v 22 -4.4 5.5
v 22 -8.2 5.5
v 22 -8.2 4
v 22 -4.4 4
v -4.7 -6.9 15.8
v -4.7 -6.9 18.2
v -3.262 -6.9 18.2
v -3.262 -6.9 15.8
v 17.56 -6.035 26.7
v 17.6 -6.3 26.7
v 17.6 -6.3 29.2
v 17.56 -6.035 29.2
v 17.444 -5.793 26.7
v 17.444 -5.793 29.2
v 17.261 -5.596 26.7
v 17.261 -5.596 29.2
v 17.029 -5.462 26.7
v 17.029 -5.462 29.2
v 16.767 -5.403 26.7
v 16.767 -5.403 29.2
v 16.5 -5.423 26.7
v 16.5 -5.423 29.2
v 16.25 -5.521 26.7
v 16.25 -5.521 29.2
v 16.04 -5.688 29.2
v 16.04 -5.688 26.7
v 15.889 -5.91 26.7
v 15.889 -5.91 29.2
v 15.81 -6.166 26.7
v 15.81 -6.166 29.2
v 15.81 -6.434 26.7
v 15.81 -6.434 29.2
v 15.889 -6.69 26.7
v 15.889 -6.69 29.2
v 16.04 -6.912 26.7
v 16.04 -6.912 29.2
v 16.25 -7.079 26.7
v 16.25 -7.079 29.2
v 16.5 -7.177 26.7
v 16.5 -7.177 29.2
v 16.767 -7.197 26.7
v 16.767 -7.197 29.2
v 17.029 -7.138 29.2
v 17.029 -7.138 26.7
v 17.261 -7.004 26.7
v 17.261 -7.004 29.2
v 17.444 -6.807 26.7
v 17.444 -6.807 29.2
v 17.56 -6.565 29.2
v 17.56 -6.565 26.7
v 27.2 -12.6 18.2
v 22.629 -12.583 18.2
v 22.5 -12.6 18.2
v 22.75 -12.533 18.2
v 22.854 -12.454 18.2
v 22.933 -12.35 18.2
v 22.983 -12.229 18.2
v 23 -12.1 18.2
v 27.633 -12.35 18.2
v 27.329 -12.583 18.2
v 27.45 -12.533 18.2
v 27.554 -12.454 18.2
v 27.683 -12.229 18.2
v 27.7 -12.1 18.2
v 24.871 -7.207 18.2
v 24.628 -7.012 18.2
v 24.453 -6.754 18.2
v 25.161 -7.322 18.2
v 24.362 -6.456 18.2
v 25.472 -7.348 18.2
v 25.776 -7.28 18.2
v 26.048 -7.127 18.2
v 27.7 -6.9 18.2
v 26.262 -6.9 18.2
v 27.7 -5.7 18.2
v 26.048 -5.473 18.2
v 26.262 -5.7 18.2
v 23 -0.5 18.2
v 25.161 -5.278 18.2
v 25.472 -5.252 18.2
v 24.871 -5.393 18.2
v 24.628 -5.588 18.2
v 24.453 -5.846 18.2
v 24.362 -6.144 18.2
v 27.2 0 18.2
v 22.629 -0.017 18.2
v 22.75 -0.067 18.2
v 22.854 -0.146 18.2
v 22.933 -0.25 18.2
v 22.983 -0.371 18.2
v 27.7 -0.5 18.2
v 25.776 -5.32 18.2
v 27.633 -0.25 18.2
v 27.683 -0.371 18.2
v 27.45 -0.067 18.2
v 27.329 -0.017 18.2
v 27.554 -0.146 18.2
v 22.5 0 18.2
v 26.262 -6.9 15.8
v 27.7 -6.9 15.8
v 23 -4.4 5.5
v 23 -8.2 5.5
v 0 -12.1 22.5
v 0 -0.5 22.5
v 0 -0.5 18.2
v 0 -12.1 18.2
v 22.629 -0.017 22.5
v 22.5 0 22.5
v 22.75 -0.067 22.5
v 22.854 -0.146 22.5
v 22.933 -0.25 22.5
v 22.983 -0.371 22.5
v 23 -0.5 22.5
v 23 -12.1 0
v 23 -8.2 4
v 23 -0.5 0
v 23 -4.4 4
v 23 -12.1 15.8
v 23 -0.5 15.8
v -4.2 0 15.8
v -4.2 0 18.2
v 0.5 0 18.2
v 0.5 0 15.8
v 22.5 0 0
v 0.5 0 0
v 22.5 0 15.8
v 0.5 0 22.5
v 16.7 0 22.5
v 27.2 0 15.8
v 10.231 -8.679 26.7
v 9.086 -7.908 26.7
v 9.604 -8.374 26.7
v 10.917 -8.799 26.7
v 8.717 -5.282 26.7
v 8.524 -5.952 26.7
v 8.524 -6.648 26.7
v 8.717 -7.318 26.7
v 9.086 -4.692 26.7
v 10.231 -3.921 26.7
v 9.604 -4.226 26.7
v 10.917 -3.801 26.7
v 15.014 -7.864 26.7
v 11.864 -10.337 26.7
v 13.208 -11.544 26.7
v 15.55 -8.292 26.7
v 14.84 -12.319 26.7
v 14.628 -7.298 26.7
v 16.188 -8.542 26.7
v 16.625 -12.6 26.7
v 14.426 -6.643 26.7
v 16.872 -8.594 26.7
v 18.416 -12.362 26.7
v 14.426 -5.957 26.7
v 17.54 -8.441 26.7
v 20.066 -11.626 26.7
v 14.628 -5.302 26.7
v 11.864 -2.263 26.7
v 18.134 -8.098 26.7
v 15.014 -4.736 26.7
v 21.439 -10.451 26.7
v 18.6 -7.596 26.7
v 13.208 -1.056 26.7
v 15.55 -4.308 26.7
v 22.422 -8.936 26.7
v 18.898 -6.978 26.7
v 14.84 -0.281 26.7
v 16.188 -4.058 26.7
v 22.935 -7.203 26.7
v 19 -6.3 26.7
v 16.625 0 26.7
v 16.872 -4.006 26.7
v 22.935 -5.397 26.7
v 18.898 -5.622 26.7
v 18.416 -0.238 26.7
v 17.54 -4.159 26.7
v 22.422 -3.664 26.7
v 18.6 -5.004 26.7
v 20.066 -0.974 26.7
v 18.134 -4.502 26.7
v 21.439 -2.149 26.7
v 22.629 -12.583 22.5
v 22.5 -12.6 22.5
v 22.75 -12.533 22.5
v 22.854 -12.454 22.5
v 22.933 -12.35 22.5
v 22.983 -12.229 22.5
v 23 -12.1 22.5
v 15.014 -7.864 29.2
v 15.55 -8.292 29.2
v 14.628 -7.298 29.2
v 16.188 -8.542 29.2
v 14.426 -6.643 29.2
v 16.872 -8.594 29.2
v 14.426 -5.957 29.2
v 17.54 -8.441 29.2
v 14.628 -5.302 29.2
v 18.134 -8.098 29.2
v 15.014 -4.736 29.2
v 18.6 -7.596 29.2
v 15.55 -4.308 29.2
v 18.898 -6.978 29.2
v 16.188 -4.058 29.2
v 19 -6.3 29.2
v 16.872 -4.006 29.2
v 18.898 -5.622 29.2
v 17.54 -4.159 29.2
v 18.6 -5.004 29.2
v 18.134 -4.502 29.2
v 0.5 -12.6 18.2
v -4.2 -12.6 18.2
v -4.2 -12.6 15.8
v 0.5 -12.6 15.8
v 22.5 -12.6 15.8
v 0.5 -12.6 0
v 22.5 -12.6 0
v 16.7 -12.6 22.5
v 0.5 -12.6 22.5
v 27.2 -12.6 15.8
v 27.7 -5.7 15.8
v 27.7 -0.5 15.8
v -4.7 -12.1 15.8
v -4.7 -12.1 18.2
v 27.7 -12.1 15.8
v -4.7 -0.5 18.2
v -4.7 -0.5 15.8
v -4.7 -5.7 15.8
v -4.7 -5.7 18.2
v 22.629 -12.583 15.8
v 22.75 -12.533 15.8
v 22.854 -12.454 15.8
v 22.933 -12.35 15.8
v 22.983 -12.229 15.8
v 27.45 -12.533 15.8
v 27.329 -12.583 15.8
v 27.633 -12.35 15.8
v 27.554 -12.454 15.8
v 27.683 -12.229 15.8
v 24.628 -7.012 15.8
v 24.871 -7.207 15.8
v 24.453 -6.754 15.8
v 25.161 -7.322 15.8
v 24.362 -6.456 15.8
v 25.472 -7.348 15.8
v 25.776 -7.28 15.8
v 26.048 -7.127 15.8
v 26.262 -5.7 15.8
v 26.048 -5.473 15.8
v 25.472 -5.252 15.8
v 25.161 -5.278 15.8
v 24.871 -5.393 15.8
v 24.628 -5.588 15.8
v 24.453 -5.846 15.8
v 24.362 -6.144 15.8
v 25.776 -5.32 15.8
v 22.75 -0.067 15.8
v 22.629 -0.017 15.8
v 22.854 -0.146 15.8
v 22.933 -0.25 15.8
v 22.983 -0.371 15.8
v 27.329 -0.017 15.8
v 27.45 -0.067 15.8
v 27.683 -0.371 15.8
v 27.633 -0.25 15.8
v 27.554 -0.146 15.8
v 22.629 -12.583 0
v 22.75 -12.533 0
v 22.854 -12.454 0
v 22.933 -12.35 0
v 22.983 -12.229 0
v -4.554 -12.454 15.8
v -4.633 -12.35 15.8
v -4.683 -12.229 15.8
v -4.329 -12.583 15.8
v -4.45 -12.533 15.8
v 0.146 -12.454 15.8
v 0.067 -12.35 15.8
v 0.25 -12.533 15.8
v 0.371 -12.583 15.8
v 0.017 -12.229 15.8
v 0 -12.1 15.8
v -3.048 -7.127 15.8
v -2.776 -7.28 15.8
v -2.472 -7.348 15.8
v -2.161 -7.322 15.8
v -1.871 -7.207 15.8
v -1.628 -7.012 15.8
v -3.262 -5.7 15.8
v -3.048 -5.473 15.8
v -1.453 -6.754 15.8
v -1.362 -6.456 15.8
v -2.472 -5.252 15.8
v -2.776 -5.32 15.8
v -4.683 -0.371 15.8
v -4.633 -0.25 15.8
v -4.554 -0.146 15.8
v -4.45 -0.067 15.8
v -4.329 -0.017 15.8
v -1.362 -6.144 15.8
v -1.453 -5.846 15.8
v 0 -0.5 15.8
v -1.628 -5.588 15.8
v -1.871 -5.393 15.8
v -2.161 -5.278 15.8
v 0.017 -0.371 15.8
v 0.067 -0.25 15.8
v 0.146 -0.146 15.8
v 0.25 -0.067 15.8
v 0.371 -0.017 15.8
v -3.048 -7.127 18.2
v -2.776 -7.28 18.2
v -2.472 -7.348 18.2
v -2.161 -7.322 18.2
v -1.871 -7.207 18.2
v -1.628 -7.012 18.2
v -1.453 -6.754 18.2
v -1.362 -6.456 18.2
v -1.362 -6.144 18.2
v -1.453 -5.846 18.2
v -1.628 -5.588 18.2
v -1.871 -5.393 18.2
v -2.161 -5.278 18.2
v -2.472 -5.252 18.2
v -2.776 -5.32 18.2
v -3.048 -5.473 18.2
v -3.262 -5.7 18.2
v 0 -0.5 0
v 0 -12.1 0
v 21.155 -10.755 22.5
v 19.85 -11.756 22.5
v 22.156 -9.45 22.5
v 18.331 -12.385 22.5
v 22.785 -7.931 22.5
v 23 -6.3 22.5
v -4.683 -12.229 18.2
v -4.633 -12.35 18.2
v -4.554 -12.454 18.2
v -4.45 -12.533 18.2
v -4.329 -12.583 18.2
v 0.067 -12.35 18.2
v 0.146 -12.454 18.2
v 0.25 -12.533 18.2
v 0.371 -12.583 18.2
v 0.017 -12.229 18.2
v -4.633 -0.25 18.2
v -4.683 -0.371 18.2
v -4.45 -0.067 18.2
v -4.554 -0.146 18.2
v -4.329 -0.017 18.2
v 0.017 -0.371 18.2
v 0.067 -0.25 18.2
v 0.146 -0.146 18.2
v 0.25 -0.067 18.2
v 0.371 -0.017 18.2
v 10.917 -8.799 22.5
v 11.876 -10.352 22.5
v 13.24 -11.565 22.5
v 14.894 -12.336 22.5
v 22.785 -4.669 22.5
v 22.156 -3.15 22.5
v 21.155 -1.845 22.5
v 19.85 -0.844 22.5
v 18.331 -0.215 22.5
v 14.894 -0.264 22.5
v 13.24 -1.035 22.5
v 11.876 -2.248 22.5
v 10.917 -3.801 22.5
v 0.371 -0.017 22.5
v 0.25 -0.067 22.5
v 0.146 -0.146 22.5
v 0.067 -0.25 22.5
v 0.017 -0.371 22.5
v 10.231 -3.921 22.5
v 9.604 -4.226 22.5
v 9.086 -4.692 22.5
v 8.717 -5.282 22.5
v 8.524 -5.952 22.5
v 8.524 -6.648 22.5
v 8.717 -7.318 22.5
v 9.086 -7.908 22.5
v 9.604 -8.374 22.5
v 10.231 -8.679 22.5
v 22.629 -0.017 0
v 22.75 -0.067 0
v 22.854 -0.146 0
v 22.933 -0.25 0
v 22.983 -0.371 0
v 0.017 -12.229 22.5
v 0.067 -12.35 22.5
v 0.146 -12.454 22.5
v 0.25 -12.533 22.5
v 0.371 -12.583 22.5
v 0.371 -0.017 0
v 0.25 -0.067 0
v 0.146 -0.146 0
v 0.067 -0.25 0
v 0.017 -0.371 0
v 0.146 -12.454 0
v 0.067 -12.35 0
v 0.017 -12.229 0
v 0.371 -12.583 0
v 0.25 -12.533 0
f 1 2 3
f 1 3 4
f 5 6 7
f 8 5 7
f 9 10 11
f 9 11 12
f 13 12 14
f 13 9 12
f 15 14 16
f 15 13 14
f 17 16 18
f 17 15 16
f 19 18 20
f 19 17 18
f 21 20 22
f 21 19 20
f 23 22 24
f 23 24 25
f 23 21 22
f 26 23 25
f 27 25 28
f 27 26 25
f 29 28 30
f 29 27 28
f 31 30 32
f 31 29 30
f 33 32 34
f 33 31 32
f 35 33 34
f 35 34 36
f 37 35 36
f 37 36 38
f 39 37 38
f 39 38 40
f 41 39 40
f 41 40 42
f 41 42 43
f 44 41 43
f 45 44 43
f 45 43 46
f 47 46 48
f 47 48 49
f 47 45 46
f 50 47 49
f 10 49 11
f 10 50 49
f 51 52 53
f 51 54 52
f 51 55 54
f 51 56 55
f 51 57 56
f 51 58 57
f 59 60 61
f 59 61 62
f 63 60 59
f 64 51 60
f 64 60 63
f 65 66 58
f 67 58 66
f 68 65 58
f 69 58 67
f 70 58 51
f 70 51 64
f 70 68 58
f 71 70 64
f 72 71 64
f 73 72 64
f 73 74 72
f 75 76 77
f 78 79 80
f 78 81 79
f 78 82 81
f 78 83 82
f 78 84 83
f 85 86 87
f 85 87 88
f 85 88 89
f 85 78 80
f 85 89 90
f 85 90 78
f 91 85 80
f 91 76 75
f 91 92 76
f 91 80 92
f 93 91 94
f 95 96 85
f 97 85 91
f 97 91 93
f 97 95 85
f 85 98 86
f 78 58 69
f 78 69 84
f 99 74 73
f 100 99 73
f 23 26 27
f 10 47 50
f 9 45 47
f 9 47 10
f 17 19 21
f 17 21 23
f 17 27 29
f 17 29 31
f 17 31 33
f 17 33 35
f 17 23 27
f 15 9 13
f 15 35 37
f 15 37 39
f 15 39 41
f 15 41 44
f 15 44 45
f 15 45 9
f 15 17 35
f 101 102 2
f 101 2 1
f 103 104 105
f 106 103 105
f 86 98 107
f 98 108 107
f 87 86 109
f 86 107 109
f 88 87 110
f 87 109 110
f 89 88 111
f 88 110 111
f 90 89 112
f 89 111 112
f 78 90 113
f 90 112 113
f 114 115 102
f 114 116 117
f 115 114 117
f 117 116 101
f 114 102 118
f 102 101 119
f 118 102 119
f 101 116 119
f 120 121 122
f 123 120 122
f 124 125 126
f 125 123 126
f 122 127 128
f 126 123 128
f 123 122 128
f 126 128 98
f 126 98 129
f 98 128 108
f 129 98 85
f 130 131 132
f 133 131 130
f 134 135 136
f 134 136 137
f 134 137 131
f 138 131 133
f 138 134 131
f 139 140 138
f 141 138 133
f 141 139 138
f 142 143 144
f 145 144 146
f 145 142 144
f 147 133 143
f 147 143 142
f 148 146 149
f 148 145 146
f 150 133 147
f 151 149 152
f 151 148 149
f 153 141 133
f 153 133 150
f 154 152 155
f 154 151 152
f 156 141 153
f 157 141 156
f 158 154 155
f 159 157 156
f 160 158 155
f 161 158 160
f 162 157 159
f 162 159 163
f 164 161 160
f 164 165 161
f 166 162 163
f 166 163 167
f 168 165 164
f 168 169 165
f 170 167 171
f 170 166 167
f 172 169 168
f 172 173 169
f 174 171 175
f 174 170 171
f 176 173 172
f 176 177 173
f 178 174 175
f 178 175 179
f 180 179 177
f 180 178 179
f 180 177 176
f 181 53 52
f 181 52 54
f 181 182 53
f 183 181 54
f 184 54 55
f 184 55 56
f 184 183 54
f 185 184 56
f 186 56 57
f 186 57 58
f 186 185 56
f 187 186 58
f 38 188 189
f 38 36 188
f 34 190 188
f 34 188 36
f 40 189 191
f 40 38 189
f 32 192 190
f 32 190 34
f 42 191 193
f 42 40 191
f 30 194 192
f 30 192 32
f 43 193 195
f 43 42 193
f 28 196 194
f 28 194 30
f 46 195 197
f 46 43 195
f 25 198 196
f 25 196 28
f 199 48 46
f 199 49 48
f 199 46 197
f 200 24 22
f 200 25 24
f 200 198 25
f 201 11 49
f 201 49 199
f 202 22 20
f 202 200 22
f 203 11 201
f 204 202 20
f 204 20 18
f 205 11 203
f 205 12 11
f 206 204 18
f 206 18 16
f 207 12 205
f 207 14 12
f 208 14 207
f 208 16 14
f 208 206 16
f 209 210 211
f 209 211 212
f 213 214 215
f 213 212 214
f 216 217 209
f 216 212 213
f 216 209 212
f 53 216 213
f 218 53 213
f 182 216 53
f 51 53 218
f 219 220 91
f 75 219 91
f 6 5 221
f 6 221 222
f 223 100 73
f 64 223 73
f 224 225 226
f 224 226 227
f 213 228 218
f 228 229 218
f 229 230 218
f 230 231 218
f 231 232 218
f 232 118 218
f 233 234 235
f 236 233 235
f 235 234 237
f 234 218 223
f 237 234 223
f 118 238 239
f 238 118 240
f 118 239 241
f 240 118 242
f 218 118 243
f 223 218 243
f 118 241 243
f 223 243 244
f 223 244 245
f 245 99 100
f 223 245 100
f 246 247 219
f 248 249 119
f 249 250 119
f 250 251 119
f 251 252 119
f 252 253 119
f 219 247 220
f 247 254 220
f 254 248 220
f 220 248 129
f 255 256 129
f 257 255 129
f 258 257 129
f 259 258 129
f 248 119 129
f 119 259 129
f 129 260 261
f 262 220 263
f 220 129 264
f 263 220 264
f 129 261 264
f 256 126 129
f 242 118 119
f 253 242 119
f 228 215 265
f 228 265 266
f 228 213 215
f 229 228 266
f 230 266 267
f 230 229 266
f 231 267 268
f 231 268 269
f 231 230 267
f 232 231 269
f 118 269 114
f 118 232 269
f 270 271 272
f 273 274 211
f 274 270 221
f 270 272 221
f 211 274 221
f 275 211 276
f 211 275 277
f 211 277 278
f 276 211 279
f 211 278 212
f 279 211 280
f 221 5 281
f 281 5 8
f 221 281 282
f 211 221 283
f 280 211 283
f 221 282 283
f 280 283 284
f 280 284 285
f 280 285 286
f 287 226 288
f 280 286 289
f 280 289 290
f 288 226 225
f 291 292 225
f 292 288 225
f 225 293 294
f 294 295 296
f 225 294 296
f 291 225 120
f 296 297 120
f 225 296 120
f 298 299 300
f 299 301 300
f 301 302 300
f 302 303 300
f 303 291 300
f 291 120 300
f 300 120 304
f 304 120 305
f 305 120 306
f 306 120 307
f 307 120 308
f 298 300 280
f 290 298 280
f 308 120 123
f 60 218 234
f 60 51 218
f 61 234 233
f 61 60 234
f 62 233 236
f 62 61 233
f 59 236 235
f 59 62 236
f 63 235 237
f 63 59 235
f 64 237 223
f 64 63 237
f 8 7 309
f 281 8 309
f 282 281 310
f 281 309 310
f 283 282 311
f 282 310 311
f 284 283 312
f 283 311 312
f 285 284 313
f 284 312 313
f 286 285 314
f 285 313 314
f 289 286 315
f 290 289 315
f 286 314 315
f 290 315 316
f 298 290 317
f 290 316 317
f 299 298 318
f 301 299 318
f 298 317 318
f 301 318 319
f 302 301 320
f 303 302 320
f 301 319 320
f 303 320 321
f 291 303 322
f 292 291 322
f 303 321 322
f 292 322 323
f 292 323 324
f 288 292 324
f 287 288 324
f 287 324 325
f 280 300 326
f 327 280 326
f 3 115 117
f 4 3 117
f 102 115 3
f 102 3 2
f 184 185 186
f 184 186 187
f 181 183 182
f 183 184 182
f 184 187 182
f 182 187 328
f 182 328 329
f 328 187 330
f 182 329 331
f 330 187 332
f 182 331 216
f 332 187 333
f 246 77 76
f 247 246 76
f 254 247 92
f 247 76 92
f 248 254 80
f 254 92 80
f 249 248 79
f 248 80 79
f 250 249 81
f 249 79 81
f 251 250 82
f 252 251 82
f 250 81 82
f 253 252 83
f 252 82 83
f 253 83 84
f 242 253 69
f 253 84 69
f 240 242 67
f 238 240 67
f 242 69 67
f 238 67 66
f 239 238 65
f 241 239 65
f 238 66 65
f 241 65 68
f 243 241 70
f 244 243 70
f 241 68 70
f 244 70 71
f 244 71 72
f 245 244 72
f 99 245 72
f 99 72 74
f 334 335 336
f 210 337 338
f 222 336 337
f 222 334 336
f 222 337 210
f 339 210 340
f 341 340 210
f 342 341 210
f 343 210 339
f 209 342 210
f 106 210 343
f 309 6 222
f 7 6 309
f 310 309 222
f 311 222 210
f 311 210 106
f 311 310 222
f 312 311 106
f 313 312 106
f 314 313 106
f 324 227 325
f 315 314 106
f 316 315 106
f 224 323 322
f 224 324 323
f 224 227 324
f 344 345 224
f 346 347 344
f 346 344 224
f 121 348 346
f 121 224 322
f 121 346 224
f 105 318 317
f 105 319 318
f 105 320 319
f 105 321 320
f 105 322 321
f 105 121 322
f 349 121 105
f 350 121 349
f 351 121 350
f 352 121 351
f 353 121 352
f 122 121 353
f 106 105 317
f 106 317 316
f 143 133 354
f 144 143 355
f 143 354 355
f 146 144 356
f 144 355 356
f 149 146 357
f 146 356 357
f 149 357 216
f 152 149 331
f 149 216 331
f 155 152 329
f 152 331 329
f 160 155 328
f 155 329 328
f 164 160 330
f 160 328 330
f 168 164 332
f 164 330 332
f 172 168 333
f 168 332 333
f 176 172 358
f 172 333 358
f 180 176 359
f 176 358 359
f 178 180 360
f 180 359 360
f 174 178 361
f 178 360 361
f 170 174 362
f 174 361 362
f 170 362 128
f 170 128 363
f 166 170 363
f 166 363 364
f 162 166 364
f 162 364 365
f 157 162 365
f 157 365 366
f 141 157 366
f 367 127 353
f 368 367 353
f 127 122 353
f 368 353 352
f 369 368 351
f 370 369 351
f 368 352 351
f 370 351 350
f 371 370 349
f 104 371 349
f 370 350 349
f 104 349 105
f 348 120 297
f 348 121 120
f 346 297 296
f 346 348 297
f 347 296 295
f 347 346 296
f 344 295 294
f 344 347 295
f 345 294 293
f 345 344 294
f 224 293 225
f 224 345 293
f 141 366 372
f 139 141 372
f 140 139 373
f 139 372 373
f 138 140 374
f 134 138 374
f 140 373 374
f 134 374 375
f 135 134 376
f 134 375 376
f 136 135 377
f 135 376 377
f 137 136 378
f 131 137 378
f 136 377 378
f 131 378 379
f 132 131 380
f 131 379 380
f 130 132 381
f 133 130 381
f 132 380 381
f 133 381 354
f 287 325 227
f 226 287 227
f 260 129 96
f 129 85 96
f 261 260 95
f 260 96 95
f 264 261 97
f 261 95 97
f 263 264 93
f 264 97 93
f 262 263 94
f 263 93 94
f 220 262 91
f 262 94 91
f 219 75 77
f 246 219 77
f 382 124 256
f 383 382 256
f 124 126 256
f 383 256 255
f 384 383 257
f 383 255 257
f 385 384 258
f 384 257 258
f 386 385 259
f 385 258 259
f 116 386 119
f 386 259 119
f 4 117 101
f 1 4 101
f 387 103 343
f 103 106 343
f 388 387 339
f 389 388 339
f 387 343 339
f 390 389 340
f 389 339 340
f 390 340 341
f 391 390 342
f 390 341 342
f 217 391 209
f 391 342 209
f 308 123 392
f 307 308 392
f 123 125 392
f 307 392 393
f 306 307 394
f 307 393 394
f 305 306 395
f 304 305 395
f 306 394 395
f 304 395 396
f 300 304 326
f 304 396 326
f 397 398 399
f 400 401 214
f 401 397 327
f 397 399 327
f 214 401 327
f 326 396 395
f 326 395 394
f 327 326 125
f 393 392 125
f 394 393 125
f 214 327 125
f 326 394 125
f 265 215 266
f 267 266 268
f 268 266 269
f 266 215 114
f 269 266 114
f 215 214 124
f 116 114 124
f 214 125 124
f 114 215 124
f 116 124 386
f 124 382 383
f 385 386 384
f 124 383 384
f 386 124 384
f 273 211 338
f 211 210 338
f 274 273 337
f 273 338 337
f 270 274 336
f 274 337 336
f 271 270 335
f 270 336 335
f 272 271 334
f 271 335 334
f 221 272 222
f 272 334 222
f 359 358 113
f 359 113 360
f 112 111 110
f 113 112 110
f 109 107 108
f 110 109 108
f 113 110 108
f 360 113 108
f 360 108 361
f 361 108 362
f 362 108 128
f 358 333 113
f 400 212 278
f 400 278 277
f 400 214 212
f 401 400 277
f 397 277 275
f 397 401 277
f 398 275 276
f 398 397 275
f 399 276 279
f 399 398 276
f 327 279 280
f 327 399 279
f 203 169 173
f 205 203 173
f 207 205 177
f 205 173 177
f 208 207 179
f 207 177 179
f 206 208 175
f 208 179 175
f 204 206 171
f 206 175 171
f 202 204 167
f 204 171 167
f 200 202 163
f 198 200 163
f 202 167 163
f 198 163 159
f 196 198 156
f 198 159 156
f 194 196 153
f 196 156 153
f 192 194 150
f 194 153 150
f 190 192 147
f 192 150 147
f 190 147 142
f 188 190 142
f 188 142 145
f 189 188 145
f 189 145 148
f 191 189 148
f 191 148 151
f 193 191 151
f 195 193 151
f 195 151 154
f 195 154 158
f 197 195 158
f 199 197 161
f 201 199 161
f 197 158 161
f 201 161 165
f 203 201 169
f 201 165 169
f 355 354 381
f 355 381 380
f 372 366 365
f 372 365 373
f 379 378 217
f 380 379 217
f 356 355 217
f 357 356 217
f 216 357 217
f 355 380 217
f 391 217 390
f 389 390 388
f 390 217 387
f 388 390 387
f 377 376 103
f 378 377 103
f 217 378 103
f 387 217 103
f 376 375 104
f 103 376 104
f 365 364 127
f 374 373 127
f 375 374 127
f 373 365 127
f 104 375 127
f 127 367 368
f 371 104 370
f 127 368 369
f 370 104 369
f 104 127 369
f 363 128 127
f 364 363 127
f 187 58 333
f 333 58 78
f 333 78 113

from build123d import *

# Parameters (mm, degrees)
F0_W      = 4.7
F0_H      = 2.4
F1_DEPTH  = 12.6
F3_DEPTH  = 4.2
F4_R      = 2.3
F4_R_2    = 0.9
F5_DEPTH  = 2.5
F7_DEPTH  = 25
F8_R      = 0.5
F9_W      = 3.8
F9_H      = 1.5
F10_DEPTH = 1


with BuildPart() as f1:
    # F0 (on Front) → F1 (new body)
    with BuildSketch(Plane.XZ):
        Polygon((0, 15.8), (0, 0), (23, 0), (23, 15.8), (23, 18.2), (23, 22.5), (0, 22.5), (0, 18.2), align=None)
        with Locations((-2.35, 17)):
            Rectangle(F0_W, F0_H)
        with Locations((25.35, 17)):
            Rectangle(F0_W, F0_H)
    extrude(amount=F1_DEPTH)

    # F2 (on face) → F3 (join)
    with BuildSketch(Plane.XY.offset(22.5)):
        with BuildLine():
            ThreePointArc((10.916667, -3.801389), (8.5, -6.3), (10.916667, -8.798611))
            ThreePointArc((10.916667, -8.798611), (23, -6.3), (10.916667, -3.801389))
        make_face()
    extrude(amount=F3_DEPTH)

    # F4 (on face) → F5 (join)
    with BuildSketch(Plane.XY.offset(26.7)):
        with Locations((16.7, -6.3)):
            Circle(F4_R)
        with Locations((16.7, -6.3)):
            Circle(F4_R_2, mode=Mode.SUBTRACT)
    extrude(amount=F5_DEPTH)

    # F6 (on face) → F7 (cut)
    with BuildSketch(Plane.XY.offset(18.2)):
        with BuildLine():
            Line((-5.387607, -6.9), (-3.261684, -6.9))
            ThreePointArc((-3.261684, -6.9), (-1.35, -6.3), (-3.261684, -5.7))
            Line((-3.261684, -5.7), (-5.387607, -5.7))
            Line((-5.387607, -5.7), (-5.387607, -6.9))
        make_face()
        with BuildLine():
            ThreePointArc((26.261684, -5.7), (24.35, -6.3), (26.261684, -6.9))
            Line((26.261684, -6.9), (28.387607, -6.9))
            Line((28.387607, -6.9), (28.387607, -5.7))
            Line((28.387607, -5.7), (26.261684, -5.7))
        make_face()
    extrude(amount=-F7_DEPTH, mode=Mode.SUBTRACT)

    # F8
    f8_edges = [f1.edges().sort_by_distance(p)[0] for p in [
        (0, -12.6, 20.35),
        (0, -12.6, 7.9),
        (0, 0, 20.35),
        (0, 0, 7.9),
        (-4.7, -12.6, 17),
        (-4.7, 0, 17),
        (27.7, -12.6, 17),
        (23, -12.6, 20.35),
        (23, -12.6, 7.9),
        (27.7, 0, 17),
        (23, 0, 20.35),
        (23, 0, 7.9),
    ]]
    fillet(f8_edges, radius=F8_R)

    # F9 (on face) → F10 (cut)
    with BuildSketch(Plane.YZ.offset(23)):
        with Locations((-6.3, 4.75)):
            Rectangle(F9_W, F9_H)
    extrude(amount=-F10_DEPTH, mode=Mode.SUBTRACT)


solid = f1.part
